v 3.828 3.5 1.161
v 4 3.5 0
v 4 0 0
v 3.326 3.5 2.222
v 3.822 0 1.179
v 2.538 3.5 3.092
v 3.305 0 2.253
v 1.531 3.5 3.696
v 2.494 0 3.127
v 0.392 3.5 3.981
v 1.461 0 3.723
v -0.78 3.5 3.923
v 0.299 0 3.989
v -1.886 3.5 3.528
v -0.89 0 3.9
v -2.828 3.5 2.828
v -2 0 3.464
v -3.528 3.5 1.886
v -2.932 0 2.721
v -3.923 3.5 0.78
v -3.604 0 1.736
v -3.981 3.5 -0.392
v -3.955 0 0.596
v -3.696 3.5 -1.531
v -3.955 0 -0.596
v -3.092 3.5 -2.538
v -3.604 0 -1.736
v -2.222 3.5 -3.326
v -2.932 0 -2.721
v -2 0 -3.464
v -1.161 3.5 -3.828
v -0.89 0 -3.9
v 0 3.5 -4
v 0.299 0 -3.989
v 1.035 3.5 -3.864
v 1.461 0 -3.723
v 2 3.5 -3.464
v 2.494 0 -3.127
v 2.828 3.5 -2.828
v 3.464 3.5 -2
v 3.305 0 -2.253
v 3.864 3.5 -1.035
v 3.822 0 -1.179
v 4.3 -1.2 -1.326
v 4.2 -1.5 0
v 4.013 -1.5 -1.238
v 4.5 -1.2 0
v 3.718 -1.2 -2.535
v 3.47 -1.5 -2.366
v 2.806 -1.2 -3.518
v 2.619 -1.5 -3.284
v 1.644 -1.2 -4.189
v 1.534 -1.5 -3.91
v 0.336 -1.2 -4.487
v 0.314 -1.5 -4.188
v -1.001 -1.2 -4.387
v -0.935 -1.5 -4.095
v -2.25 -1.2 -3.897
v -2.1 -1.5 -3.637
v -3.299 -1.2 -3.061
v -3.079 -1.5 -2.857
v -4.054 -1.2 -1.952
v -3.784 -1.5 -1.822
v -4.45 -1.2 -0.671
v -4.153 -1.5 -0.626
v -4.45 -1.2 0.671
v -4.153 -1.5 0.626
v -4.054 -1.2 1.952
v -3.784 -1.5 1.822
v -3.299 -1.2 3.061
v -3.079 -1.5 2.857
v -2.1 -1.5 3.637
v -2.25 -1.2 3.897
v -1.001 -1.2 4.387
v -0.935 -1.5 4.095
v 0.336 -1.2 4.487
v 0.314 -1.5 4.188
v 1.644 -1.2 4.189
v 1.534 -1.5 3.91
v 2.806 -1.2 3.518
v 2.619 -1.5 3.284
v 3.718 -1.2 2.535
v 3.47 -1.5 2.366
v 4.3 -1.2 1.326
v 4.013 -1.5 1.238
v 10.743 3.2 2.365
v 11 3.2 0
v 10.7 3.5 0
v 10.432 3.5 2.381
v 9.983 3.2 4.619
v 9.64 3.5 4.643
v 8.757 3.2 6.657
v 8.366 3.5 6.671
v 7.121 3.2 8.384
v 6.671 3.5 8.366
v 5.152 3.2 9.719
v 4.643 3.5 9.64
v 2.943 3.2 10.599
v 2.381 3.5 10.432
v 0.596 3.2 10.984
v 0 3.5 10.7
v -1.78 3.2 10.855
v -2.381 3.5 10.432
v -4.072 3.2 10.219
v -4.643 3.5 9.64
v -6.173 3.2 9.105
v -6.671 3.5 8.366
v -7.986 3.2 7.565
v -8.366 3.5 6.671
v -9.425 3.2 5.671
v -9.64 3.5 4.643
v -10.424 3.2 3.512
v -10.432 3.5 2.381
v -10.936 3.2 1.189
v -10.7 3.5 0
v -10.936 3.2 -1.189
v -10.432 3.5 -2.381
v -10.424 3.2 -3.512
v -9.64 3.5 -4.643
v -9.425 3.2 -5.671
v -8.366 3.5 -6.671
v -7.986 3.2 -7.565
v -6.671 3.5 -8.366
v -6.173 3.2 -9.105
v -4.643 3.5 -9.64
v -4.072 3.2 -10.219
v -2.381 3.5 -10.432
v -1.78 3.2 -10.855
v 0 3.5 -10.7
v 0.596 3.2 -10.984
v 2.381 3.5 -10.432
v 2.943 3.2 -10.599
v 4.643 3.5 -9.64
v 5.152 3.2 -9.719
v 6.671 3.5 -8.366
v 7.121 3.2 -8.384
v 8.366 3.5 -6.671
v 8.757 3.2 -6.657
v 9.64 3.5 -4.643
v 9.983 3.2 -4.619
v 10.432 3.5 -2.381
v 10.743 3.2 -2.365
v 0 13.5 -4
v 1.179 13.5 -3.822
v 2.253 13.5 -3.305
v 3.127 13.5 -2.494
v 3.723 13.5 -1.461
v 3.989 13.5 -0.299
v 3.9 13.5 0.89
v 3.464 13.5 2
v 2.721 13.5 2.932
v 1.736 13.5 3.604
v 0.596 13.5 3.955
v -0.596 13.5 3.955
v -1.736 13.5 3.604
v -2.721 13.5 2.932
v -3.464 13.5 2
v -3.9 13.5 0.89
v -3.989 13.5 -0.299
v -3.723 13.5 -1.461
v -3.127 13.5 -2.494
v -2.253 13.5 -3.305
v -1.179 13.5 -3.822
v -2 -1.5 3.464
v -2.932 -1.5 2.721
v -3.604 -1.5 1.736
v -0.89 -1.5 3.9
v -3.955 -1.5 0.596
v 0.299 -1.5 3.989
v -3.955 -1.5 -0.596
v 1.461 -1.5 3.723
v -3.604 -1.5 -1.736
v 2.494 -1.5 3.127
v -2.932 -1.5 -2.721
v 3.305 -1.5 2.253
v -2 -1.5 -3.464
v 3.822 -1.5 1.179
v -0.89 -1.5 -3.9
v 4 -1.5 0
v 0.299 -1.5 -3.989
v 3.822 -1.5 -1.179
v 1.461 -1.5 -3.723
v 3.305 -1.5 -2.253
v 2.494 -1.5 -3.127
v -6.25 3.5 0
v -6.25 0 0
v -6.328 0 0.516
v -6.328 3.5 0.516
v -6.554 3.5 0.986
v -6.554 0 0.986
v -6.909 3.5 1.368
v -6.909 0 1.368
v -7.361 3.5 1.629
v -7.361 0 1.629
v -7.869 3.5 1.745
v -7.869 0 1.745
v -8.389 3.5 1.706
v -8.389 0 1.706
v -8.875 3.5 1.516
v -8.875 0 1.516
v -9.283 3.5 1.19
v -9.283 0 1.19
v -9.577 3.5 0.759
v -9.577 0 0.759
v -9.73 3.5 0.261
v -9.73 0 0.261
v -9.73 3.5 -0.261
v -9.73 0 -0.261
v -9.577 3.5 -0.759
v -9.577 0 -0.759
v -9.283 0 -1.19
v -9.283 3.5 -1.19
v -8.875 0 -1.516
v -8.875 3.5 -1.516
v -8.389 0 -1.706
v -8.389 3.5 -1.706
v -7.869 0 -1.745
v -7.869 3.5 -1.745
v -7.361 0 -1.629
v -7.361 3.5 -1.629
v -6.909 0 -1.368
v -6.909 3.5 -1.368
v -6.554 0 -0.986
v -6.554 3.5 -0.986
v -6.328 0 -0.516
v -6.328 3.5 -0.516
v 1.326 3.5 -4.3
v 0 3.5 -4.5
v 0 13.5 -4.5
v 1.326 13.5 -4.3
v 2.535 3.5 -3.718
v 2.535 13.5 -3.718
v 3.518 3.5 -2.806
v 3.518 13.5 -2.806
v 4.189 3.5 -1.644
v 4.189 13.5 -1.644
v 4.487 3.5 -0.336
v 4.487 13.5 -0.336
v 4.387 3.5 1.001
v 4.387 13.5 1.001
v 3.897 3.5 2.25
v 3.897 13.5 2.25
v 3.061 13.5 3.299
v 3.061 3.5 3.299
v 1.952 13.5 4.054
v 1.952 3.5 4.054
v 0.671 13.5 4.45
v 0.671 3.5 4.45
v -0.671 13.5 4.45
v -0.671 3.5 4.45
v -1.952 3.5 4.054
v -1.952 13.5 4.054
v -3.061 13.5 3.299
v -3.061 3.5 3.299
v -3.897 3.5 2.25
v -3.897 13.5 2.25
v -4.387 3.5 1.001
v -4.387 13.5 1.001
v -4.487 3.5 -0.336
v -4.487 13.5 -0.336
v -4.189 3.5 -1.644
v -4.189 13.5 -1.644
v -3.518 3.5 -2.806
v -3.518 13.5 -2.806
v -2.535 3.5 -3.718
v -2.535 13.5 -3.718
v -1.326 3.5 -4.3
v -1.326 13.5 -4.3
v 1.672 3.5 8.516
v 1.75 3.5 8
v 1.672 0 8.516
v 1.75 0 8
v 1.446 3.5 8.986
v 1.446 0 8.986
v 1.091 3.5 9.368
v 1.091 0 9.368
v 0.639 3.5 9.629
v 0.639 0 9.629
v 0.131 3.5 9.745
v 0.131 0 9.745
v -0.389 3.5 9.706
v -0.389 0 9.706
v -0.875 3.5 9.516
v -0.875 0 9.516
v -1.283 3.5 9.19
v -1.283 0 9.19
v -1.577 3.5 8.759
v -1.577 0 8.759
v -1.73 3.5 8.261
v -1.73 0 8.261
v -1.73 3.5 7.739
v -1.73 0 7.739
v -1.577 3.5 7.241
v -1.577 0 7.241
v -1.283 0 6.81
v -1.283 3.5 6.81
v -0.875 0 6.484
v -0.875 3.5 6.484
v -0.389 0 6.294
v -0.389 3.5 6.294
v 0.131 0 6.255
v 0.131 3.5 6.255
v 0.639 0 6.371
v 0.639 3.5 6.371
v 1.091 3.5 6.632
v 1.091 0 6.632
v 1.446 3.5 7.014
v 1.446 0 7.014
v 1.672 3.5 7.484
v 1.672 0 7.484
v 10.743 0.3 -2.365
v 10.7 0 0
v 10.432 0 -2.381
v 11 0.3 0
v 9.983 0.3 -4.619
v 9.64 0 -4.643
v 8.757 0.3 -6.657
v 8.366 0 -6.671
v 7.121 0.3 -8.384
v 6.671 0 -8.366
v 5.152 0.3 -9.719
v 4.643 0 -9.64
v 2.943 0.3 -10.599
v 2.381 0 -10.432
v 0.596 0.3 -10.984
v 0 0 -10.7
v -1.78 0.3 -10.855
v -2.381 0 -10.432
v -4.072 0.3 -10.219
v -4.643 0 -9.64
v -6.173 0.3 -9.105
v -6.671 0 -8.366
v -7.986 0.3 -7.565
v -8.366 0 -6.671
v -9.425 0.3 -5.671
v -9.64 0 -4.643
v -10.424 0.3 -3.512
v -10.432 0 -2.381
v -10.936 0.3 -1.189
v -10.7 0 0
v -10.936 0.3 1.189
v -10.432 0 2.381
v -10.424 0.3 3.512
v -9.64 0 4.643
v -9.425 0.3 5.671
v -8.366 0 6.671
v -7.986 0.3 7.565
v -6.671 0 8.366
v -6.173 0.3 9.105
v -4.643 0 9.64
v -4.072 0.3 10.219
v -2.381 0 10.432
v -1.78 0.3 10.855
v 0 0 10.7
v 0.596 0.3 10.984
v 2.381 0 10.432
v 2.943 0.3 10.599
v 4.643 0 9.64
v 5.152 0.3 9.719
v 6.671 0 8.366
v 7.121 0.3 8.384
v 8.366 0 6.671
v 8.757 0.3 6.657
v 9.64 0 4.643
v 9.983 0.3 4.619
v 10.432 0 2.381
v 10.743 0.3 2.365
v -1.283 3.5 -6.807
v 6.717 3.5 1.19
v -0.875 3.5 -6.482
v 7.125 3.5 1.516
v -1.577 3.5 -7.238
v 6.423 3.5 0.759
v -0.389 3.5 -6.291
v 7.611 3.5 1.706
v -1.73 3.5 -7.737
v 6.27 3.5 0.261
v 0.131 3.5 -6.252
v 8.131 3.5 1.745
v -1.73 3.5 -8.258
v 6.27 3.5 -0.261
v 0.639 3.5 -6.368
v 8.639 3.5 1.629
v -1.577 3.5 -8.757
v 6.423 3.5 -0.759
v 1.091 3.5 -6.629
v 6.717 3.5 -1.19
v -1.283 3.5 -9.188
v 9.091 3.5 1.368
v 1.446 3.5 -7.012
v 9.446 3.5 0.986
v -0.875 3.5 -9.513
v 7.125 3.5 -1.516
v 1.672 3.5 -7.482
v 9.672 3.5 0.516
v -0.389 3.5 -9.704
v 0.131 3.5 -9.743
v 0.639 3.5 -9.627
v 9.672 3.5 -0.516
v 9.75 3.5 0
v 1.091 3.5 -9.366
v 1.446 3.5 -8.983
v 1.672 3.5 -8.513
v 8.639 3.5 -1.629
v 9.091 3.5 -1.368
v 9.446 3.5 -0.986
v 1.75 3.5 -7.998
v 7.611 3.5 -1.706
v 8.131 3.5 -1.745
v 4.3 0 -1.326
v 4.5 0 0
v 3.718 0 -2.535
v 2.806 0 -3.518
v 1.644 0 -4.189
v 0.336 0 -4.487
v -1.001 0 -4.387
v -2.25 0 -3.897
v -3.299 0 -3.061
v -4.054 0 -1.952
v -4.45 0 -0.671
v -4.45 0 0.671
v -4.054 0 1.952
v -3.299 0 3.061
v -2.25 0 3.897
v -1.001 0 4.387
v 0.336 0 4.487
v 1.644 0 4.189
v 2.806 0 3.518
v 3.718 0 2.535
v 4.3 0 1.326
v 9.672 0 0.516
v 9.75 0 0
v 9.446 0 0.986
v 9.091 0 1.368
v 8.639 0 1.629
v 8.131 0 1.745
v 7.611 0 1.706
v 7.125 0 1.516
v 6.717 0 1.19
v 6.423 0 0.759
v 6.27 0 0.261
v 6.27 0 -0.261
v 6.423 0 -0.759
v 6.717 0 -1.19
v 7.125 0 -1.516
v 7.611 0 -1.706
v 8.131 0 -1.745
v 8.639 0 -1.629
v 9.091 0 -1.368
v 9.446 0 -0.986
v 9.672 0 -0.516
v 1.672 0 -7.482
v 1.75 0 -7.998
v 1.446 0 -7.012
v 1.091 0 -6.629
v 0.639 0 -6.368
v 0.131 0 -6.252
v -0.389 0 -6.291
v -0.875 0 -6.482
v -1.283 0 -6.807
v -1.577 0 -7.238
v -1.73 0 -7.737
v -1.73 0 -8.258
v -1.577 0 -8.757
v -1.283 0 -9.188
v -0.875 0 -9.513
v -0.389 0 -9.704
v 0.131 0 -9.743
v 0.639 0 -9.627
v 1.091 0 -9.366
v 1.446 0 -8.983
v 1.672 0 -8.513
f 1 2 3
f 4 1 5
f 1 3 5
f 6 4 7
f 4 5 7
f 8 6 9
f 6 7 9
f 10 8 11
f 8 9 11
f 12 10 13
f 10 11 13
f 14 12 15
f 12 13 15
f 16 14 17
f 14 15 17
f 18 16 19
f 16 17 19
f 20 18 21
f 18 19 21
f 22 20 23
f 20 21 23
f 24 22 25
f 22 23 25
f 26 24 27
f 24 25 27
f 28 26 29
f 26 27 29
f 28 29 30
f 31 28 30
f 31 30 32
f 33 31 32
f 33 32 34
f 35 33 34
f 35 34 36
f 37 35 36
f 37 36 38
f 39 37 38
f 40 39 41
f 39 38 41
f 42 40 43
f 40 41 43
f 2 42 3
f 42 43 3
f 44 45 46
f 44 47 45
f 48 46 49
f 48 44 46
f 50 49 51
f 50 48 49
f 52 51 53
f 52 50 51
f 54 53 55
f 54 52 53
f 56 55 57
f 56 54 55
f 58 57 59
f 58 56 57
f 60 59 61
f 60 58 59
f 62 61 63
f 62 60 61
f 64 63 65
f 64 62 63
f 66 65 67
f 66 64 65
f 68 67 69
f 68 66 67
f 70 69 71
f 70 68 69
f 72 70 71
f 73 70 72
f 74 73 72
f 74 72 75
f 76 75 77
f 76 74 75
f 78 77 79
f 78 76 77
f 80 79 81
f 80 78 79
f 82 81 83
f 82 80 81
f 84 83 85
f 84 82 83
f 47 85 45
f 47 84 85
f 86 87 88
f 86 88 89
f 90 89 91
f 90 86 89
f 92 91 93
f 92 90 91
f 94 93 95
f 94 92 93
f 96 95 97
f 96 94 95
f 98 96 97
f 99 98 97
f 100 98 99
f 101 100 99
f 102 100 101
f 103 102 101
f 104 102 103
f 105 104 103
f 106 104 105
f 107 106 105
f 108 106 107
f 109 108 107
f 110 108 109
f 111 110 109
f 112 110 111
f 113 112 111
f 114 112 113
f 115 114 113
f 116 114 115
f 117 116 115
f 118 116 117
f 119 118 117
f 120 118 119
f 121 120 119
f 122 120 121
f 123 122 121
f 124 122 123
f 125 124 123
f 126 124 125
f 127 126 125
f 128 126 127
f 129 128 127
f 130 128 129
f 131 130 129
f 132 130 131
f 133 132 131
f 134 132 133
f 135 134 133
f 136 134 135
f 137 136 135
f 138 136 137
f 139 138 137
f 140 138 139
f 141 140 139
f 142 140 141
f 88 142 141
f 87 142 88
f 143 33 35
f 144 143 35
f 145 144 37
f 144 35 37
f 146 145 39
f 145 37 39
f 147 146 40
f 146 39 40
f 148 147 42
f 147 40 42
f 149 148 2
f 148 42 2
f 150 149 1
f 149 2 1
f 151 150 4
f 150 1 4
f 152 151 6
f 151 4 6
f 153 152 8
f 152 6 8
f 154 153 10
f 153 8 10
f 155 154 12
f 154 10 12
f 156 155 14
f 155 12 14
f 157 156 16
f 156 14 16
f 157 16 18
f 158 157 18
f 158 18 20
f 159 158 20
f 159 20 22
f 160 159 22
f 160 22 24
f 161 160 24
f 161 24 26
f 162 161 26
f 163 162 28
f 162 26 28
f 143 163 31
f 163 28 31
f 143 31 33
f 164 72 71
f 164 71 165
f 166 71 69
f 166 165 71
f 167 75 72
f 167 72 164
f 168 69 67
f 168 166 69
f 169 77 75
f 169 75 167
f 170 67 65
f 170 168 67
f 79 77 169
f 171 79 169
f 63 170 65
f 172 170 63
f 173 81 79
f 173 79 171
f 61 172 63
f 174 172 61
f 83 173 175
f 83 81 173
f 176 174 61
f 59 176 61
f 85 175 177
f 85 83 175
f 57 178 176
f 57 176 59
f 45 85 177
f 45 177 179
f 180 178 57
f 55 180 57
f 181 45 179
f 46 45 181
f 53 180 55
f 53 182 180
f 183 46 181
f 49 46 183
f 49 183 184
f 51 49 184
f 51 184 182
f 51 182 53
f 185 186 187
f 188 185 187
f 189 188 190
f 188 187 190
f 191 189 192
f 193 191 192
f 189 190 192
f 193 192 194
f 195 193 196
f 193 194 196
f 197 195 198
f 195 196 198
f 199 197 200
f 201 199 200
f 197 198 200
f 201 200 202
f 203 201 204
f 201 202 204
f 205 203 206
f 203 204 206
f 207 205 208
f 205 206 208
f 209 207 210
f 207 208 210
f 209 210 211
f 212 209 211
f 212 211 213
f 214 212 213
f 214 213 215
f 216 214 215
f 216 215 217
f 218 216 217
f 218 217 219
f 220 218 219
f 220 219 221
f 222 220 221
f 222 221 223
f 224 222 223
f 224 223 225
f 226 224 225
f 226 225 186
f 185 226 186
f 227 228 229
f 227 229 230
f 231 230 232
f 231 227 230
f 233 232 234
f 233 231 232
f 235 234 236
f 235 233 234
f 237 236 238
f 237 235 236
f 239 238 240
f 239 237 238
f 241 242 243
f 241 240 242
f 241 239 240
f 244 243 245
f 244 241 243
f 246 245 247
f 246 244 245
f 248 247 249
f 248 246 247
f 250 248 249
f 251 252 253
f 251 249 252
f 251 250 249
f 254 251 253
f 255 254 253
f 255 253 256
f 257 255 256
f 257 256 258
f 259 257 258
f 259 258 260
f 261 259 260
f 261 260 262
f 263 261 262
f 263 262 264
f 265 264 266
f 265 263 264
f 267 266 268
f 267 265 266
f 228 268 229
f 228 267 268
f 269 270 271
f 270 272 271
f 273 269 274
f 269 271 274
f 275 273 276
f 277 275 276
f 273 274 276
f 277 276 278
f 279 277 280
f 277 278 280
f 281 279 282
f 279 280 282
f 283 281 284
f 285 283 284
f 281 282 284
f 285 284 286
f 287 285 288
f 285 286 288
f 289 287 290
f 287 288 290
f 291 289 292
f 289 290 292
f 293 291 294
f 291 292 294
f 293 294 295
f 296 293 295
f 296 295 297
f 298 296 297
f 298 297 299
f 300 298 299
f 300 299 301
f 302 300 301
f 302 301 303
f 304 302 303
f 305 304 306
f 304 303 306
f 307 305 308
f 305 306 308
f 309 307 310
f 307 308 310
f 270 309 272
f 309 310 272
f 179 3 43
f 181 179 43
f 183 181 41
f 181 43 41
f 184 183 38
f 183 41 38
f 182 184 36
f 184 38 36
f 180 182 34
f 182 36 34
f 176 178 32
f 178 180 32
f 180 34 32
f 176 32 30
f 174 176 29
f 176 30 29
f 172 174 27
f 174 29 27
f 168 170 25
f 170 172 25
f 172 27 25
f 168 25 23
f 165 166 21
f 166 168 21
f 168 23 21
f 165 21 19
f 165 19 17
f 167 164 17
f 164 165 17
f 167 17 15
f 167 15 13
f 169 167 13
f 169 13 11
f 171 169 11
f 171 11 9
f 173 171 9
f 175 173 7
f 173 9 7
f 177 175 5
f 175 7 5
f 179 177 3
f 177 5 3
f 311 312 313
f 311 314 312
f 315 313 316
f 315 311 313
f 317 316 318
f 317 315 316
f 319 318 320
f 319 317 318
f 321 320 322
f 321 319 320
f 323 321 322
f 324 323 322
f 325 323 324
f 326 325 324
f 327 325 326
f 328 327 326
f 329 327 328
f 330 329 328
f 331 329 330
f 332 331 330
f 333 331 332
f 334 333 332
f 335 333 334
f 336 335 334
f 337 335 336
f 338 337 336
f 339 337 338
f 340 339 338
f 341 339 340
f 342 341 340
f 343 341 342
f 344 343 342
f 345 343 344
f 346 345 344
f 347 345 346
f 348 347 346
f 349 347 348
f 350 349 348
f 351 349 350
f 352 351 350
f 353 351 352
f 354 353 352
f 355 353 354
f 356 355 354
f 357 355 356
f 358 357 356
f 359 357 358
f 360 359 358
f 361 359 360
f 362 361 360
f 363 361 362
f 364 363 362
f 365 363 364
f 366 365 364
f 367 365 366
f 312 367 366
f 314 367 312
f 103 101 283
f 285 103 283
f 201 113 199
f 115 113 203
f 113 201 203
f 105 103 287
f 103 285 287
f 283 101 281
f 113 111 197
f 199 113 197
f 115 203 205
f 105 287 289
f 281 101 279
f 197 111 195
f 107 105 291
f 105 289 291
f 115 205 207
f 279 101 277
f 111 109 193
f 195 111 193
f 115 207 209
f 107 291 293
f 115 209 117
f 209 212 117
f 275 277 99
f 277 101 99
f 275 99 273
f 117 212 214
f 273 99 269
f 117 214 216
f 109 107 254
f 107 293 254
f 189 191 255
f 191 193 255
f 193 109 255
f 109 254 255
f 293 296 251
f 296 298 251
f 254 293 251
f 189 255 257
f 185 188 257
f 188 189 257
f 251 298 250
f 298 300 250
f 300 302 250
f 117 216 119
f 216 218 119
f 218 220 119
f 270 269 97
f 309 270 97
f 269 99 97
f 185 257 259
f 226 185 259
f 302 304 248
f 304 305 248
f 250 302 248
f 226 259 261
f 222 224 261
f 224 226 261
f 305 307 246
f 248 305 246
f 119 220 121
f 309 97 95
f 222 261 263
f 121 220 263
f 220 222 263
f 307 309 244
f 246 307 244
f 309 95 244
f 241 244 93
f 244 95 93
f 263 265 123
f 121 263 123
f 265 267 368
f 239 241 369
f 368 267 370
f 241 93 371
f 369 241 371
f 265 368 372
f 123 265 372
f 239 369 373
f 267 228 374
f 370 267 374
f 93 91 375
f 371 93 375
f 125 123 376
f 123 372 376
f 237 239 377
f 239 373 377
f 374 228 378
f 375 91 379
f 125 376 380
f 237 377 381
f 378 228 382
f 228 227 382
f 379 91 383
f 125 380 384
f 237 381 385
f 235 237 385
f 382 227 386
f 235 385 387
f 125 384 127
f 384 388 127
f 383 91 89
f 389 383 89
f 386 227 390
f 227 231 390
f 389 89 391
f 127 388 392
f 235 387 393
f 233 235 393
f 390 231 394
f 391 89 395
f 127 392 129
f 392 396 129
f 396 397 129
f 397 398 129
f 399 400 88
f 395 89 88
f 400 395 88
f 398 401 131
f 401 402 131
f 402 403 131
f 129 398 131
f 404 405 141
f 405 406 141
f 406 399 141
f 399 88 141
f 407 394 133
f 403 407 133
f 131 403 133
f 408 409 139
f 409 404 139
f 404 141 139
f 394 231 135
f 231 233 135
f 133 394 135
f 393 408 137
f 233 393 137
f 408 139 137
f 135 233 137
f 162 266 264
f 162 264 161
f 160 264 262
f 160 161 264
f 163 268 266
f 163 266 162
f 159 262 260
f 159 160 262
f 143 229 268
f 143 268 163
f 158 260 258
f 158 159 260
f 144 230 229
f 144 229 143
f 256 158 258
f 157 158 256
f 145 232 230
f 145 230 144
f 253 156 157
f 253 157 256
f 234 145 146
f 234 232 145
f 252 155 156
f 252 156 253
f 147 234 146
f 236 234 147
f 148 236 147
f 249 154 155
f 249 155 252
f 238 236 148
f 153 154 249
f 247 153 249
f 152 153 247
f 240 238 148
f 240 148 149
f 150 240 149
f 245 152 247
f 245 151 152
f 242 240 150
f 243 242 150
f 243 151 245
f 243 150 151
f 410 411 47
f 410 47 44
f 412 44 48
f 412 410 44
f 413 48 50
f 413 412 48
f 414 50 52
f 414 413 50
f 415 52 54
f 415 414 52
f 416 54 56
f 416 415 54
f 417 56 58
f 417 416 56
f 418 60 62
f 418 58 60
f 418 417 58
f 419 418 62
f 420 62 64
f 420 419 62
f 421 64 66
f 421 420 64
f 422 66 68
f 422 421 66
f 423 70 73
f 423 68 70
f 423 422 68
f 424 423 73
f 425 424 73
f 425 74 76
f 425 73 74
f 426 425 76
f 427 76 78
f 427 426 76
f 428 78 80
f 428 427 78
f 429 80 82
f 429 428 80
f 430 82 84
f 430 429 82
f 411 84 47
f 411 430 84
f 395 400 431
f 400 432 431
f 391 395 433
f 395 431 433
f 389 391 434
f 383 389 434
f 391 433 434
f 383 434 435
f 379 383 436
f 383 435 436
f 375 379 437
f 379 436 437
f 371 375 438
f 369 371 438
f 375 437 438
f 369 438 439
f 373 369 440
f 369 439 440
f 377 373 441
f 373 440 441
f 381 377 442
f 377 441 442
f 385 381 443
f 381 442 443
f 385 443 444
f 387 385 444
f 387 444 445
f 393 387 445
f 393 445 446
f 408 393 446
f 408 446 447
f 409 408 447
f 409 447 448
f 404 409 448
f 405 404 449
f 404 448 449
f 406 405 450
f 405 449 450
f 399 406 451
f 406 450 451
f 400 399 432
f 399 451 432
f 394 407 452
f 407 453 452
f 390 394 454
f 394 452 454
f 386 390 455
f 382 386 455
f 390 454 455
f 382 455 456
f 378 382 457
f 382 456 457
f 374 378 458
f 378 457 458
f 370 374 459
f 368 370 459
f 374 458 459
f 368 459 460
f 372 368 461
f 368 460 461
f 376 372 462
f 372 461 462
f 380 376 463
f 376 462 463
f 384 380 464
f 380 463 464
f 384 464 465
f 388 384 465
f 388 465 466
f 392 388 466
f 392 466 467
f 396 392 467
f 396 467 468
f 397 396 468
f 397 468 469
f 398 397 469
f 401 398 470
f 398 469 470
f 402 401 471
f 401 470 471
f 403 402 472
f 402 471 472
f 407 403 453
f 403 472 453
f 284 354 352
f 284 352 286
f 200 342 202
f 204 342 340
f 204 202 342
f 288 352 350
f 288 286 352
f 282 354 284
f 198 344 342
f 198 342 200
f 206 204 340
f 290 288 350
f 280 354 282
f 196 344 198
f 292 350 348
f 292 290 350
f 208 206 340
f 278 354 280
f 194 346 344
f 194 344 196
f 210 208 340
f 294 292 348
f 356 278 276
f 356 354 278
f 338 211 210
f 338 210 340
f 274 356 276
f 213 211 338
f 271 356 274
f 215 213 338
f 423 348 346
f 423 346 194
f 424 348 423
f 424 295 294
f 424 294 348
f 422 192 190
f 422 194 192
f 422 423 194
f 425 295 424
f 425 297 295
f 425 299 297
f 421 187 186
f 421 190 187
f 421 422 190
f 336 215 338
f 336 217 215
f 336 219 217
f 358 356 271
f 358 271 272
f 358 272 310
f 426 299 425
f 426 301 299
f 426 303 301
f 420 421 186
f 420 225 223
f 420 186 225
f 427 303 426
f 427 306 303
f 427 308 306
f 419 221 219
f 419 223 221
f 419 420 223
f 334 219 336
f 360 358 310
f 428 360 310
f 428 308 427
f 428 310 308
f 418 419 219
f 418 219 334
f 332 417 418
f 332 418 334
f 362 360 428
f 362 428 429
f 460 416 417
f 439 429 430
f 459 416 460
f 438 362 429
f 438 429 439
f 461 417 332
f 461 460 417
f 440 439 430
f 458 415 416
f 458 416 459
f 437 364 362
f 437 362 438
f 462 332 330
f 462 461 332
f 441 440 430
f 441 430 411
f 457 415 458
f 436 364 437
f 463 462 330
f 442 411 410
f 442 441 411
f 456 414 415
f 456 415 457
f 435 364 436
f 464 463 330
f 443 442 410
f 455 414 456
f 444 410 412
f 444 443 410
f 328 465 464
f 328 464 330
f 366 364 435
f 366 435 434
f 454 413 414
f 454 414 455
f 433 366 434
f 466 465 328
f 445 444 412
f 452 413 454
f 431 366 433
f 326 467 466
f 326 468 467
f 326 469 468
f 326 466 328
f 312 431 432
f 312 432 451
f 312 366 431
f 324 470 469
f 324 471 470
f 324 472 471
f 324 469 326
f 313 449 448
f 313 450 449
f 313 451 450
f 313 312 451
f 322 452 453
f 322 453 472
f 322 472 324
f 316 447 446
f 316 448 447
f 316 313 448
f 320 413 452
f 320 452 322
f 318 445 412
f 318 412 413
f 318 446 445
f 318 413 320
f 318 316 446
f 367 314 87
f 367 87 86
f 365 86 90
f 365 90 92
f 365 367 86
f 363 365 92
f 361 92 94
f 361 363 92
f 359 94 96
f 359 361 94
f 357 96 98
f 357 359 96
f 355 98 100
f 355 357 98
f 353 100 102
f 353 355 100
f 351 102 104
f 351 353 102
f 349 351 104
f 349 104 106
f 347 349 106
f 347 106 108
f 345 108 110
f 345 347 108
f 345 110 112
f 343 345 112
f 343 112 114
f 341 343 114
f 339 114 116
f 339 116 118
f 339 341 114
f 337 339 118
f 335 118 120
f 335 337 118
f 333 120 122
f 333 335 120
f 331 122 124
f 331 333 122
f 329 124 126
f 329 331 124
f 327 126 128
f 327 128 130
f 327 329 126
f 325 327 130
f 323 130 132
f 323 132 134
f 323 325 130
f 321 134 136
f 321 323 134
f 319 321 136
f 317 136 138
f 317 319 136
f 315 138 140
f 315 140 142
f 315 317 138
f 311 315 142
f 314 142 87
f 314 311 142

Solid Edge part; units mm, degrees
sketch "Sketch1" plane through (0, 0, 0) normal (0, -1, 0) x (1, 0, 0)
  circle A0 centre (0, 0) radius 11
  circle A1 centre (8, 0) radius 1.75
  circle A2 centre (0, -7.9975) radius 1.75
  circle A3 centre (-8, 0) radius 1.75
  circle A4 centre (0, 8) radius 1.75
  circle A5 centre (0, 0) radius 4
  dimension "D1" = 22
  dimension "D2" = 8
  dimension "D3" = 3.5
  dimension "D4" = 15.9975
  dimension "D5" = 3.5
  dimension "D6" = 3.5
  dimension "D7" = 3.5
extrude "Protrusion1" add sketch "Sketch1" against normal blind 3.5
sketch "Sketch2" plane through (0, 0, 0) normal (0, -1, 0) x (1, 0, 0)
  circle A0 centre (0, 0) radius 4
  circle A1 centre (0, 0) radius 4.5
extrude "ExtrudedProtrusion_2" add sketch "Sketch2" along normal blind 1.5
chamfer "Chamfer_1" distance 0.3 angle 45 1 edges at (-4.5, -1.5, 0)
chamfer "Chamfer_2" distance 0.3 angle 45 2 edges at (-11, 0, 0) (-11, 3.5, 0)
sketch "Sketch3" plane through (0, 3.5, 0) normal (0, 1, 0) x (0, 0, -1)
  circle A0 centre (0, 0) radius 4.5
  circle A1 centre (0, 0) radius 4
extrude "ExtrudedProtrusion_3" add sketch "Sketch3" along normal blind 10
properties material "Brass, yellow brass"
